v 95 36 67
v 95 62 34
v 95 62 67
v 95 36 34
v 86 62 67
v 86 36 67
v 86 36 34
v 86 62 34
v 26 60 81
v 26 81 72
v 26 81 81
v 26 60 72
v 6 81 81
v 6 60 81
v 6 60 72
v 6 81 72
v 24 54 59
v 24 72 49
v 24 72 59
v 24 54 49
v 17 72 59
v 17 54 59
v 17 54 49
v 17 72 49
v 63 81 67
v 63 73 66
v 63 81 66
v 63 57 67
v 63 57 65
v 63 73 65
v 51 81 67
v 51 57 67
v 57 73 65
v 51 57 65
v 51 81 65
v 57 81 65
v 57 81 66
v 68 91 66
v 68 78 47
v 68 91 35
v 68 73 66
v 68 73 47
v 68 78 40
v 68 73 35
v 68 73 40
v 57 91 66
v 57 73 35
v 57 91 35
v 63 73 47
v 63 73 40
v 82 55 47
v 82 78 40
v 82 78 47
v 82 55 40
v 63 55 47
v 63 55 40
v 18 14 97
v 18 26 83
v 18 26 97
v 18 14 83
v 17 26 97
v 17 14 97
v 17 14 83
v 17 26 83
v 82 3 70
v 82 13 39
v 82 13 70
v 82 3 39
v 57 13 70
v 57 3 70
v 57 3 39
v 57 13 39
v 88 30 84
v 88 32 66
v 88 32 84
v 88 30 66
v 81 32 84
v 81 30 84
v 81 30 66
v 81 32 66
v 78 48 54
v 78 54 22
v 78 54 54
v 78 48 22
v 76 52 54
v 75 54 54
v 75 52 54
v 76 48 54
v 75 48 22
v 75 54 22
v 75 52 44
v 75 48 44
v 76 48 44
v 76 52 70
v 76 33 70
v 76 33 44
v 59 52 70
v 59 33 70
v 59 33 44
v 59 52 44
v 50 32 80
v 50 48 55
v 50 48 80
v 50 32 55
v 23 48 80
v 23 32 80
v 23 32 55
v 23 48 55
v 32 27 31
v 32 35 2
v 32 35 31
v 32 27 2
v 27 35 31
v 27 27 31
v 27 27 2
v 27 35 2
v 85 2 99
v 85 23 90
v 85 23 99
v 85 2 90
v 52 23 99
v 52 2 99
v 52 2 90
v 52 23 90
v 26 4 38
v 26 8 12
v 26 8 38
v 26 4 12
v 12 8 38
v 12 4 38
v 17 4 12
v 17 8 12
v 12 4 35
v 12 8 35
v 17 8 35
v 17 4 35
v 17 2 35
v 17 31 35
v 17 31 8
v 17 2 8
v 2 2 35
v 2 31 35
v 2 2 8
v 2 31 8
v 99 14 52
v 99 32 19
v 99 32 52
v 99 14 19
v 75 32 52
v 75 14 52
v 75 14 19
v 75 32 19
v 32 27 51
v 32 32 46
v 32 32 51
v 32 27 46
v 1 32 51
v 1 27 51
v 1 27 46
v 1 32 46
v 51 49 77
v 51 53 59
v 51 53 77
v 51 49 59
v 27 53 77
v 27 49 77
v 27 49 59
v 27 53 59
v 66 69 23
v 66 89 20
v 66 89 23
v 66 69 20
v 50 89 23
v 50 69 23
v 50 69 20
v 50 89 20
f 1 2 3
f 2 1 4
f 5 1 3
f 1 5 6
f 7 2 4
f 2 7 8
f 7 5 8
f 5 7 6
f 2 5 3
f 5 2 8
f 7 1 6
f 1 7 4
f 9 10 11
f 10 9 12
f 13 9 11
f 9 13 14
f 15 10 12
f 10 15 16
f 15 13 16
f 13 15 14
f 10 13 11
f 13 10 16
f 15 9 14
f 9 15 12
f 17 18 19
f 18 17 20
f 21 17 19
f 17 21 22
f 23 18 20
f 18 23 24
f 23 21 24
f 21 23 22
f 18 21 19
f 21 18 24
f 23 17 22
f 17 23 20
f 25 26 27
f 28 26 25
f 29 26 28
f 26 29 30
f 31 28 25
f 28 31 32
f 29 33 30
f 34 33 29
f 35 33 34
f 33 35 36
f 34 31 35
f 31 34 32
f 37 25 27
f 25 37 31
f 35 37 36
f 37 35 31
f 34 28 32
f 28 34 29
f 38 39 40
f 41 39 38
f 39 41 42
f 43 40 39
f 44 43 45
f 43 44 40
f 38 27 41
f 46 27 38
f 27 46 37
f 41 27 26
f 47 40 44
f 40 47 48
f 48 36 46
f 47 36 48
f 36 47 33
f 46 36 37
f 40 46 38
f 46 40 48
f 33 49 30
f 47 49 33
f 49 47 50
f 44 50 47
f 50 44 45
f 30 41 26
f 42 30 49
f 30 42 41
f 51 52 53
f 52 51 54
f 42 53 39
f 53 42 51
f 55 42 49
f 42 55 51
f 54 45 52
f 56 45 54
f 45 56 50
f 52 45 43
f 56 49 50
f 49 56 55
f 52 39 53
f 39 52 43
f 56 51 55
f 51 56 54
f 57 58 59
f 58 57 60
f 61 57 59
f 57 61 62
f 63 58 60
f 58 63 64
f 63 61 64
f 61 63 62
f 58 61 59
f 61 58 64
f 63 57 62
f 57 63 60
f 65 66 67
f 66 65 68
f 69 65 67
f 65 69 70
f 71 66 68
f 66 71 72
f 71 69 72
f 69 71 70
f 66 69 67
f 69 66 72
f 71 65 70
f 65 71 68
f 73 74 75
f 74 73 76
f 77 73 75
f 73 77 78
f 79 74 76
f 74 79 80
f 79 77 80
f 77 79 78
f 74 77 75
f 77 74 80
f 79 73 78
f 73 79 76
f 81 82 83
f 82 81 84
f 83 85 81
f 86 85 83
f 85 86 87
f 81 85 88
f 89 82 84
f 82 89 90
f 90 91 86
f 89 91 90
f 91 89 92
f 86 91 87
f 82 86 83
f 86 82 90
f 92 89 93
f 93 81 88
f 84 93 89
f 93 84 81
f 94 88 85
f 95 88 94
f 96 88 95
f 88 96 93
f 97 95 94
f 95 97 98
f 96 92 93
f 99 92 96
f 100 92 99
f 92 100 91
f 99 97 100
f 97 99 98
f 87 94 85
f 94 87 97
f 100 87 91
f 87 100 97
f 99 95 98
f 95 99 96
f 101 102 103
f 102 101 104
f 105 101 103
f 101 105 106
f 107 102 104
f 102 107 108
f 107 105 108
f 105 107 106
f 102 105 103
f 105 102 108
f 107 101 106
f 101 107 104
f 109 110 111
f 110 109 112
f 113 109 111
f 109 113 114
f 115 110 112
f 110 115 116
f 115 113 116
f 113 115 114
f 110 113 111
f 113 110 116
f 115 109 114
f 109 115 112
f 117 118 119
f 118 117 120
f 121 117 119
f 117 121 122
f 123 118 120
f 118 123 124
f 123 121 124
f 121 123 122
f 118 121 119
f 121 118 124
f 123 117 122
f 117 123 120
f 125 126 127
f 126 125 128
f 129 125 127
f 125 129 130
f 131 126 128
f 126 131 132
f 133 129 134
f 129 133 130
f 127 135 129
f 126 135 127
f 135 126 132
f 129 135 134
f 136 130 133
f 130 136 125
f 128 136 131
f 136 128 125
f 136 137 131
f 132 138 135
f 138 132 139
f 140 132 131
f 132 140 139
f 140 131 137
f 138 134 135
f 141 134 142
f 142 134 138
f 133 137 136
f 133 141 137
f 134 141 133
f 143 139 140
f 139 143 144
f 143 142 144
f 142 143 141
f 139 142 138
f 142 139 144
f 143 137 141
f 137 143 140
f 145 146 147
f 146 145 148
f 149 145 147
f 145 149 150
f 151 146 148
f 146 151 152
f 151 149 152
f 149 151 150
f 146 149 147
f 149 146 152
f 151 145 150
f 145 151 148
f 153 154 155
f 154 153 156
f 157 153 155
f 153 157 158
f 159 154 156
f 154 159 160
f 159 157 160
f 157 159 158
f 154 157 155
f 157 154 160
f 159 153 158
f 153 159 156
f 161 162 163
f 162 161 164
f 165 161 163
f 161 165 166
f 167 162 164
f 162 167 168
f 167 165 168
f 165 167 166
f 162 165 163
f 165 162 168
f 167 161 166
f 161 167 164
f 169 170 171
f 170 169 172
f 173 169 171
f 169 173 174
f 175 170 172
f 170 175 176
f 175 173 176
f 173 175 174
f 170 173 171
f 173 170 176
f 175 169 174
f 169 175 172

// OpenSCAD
union() {
	translate(v = [86, 36, 34]) {
		cube(size = [9, 26, 33]);
	}
	translate(v = [86, 36, 34]) {
		cube(size = [9, 26, 33]);
	}
	translate(v = [6, 60, 72]) {
		cube(size = [20, 21, 9]);
	}
	translate(v = [17, 54, 49]) {
		cube(size = [7, 18, 10]);
	}
	translate(v = [51, 57, 65]) {
		cube(size = [12, 24, 2]);
	}
	translate(v = [57, 73, 35]) {
		cube(size = [11, 18, 31]);
	}
	translate(v = [63, 55, 40]) {
		cube(size = [19, 23, 7]);
	}
	translate(v = [17, 14, 83]) {
		cube(size = [1, 12, 14]);
	}
	translate(v = [57, 3, 39]) {
		cube(size = [25, 10, 31]);
	}
	translate(v = [81, 30, 66]) {
		cube(size = [7, 2, 18]);
	}
	translate(v = [75, 48, 22]) {
		cube(size = [3, 6, 32]);
	}
	translate(v = [59, 33, 44]) {
		cube(size = [17, 19, 26]);
	}
	translate(v = [23, 32, 55]) {
		cube(size = [27, 16, 25]);
	}
	translate(v = [27, 27, 2]) {
		cube(size = [5, 8, 29]);
	}
	translate(v = [52, 2, 90]) {
		cube(size = [33, 21, 9]);
	}
	translate(v = [12, 4, 12]) {
		cube(size = [14, 4, 26]);
	}
	translate(v = [2, 2, 8]) {
		cube(size = [15, 29, 27]);
	}
	translate(v = [75, 14, 19]) {
		cube(size = [24, 18, 33]);
	}
	translate(v = [1, 27, 46]) {
		cube(size = [31, 5, 5]);
	}
	translate(v = [27, 49, 59]) {
		cube(size = [24, 4, 18]);
	}
	translate(v = [50, 69, 20]) {
		cube(size = [16, 20, 3]);
	}
}
